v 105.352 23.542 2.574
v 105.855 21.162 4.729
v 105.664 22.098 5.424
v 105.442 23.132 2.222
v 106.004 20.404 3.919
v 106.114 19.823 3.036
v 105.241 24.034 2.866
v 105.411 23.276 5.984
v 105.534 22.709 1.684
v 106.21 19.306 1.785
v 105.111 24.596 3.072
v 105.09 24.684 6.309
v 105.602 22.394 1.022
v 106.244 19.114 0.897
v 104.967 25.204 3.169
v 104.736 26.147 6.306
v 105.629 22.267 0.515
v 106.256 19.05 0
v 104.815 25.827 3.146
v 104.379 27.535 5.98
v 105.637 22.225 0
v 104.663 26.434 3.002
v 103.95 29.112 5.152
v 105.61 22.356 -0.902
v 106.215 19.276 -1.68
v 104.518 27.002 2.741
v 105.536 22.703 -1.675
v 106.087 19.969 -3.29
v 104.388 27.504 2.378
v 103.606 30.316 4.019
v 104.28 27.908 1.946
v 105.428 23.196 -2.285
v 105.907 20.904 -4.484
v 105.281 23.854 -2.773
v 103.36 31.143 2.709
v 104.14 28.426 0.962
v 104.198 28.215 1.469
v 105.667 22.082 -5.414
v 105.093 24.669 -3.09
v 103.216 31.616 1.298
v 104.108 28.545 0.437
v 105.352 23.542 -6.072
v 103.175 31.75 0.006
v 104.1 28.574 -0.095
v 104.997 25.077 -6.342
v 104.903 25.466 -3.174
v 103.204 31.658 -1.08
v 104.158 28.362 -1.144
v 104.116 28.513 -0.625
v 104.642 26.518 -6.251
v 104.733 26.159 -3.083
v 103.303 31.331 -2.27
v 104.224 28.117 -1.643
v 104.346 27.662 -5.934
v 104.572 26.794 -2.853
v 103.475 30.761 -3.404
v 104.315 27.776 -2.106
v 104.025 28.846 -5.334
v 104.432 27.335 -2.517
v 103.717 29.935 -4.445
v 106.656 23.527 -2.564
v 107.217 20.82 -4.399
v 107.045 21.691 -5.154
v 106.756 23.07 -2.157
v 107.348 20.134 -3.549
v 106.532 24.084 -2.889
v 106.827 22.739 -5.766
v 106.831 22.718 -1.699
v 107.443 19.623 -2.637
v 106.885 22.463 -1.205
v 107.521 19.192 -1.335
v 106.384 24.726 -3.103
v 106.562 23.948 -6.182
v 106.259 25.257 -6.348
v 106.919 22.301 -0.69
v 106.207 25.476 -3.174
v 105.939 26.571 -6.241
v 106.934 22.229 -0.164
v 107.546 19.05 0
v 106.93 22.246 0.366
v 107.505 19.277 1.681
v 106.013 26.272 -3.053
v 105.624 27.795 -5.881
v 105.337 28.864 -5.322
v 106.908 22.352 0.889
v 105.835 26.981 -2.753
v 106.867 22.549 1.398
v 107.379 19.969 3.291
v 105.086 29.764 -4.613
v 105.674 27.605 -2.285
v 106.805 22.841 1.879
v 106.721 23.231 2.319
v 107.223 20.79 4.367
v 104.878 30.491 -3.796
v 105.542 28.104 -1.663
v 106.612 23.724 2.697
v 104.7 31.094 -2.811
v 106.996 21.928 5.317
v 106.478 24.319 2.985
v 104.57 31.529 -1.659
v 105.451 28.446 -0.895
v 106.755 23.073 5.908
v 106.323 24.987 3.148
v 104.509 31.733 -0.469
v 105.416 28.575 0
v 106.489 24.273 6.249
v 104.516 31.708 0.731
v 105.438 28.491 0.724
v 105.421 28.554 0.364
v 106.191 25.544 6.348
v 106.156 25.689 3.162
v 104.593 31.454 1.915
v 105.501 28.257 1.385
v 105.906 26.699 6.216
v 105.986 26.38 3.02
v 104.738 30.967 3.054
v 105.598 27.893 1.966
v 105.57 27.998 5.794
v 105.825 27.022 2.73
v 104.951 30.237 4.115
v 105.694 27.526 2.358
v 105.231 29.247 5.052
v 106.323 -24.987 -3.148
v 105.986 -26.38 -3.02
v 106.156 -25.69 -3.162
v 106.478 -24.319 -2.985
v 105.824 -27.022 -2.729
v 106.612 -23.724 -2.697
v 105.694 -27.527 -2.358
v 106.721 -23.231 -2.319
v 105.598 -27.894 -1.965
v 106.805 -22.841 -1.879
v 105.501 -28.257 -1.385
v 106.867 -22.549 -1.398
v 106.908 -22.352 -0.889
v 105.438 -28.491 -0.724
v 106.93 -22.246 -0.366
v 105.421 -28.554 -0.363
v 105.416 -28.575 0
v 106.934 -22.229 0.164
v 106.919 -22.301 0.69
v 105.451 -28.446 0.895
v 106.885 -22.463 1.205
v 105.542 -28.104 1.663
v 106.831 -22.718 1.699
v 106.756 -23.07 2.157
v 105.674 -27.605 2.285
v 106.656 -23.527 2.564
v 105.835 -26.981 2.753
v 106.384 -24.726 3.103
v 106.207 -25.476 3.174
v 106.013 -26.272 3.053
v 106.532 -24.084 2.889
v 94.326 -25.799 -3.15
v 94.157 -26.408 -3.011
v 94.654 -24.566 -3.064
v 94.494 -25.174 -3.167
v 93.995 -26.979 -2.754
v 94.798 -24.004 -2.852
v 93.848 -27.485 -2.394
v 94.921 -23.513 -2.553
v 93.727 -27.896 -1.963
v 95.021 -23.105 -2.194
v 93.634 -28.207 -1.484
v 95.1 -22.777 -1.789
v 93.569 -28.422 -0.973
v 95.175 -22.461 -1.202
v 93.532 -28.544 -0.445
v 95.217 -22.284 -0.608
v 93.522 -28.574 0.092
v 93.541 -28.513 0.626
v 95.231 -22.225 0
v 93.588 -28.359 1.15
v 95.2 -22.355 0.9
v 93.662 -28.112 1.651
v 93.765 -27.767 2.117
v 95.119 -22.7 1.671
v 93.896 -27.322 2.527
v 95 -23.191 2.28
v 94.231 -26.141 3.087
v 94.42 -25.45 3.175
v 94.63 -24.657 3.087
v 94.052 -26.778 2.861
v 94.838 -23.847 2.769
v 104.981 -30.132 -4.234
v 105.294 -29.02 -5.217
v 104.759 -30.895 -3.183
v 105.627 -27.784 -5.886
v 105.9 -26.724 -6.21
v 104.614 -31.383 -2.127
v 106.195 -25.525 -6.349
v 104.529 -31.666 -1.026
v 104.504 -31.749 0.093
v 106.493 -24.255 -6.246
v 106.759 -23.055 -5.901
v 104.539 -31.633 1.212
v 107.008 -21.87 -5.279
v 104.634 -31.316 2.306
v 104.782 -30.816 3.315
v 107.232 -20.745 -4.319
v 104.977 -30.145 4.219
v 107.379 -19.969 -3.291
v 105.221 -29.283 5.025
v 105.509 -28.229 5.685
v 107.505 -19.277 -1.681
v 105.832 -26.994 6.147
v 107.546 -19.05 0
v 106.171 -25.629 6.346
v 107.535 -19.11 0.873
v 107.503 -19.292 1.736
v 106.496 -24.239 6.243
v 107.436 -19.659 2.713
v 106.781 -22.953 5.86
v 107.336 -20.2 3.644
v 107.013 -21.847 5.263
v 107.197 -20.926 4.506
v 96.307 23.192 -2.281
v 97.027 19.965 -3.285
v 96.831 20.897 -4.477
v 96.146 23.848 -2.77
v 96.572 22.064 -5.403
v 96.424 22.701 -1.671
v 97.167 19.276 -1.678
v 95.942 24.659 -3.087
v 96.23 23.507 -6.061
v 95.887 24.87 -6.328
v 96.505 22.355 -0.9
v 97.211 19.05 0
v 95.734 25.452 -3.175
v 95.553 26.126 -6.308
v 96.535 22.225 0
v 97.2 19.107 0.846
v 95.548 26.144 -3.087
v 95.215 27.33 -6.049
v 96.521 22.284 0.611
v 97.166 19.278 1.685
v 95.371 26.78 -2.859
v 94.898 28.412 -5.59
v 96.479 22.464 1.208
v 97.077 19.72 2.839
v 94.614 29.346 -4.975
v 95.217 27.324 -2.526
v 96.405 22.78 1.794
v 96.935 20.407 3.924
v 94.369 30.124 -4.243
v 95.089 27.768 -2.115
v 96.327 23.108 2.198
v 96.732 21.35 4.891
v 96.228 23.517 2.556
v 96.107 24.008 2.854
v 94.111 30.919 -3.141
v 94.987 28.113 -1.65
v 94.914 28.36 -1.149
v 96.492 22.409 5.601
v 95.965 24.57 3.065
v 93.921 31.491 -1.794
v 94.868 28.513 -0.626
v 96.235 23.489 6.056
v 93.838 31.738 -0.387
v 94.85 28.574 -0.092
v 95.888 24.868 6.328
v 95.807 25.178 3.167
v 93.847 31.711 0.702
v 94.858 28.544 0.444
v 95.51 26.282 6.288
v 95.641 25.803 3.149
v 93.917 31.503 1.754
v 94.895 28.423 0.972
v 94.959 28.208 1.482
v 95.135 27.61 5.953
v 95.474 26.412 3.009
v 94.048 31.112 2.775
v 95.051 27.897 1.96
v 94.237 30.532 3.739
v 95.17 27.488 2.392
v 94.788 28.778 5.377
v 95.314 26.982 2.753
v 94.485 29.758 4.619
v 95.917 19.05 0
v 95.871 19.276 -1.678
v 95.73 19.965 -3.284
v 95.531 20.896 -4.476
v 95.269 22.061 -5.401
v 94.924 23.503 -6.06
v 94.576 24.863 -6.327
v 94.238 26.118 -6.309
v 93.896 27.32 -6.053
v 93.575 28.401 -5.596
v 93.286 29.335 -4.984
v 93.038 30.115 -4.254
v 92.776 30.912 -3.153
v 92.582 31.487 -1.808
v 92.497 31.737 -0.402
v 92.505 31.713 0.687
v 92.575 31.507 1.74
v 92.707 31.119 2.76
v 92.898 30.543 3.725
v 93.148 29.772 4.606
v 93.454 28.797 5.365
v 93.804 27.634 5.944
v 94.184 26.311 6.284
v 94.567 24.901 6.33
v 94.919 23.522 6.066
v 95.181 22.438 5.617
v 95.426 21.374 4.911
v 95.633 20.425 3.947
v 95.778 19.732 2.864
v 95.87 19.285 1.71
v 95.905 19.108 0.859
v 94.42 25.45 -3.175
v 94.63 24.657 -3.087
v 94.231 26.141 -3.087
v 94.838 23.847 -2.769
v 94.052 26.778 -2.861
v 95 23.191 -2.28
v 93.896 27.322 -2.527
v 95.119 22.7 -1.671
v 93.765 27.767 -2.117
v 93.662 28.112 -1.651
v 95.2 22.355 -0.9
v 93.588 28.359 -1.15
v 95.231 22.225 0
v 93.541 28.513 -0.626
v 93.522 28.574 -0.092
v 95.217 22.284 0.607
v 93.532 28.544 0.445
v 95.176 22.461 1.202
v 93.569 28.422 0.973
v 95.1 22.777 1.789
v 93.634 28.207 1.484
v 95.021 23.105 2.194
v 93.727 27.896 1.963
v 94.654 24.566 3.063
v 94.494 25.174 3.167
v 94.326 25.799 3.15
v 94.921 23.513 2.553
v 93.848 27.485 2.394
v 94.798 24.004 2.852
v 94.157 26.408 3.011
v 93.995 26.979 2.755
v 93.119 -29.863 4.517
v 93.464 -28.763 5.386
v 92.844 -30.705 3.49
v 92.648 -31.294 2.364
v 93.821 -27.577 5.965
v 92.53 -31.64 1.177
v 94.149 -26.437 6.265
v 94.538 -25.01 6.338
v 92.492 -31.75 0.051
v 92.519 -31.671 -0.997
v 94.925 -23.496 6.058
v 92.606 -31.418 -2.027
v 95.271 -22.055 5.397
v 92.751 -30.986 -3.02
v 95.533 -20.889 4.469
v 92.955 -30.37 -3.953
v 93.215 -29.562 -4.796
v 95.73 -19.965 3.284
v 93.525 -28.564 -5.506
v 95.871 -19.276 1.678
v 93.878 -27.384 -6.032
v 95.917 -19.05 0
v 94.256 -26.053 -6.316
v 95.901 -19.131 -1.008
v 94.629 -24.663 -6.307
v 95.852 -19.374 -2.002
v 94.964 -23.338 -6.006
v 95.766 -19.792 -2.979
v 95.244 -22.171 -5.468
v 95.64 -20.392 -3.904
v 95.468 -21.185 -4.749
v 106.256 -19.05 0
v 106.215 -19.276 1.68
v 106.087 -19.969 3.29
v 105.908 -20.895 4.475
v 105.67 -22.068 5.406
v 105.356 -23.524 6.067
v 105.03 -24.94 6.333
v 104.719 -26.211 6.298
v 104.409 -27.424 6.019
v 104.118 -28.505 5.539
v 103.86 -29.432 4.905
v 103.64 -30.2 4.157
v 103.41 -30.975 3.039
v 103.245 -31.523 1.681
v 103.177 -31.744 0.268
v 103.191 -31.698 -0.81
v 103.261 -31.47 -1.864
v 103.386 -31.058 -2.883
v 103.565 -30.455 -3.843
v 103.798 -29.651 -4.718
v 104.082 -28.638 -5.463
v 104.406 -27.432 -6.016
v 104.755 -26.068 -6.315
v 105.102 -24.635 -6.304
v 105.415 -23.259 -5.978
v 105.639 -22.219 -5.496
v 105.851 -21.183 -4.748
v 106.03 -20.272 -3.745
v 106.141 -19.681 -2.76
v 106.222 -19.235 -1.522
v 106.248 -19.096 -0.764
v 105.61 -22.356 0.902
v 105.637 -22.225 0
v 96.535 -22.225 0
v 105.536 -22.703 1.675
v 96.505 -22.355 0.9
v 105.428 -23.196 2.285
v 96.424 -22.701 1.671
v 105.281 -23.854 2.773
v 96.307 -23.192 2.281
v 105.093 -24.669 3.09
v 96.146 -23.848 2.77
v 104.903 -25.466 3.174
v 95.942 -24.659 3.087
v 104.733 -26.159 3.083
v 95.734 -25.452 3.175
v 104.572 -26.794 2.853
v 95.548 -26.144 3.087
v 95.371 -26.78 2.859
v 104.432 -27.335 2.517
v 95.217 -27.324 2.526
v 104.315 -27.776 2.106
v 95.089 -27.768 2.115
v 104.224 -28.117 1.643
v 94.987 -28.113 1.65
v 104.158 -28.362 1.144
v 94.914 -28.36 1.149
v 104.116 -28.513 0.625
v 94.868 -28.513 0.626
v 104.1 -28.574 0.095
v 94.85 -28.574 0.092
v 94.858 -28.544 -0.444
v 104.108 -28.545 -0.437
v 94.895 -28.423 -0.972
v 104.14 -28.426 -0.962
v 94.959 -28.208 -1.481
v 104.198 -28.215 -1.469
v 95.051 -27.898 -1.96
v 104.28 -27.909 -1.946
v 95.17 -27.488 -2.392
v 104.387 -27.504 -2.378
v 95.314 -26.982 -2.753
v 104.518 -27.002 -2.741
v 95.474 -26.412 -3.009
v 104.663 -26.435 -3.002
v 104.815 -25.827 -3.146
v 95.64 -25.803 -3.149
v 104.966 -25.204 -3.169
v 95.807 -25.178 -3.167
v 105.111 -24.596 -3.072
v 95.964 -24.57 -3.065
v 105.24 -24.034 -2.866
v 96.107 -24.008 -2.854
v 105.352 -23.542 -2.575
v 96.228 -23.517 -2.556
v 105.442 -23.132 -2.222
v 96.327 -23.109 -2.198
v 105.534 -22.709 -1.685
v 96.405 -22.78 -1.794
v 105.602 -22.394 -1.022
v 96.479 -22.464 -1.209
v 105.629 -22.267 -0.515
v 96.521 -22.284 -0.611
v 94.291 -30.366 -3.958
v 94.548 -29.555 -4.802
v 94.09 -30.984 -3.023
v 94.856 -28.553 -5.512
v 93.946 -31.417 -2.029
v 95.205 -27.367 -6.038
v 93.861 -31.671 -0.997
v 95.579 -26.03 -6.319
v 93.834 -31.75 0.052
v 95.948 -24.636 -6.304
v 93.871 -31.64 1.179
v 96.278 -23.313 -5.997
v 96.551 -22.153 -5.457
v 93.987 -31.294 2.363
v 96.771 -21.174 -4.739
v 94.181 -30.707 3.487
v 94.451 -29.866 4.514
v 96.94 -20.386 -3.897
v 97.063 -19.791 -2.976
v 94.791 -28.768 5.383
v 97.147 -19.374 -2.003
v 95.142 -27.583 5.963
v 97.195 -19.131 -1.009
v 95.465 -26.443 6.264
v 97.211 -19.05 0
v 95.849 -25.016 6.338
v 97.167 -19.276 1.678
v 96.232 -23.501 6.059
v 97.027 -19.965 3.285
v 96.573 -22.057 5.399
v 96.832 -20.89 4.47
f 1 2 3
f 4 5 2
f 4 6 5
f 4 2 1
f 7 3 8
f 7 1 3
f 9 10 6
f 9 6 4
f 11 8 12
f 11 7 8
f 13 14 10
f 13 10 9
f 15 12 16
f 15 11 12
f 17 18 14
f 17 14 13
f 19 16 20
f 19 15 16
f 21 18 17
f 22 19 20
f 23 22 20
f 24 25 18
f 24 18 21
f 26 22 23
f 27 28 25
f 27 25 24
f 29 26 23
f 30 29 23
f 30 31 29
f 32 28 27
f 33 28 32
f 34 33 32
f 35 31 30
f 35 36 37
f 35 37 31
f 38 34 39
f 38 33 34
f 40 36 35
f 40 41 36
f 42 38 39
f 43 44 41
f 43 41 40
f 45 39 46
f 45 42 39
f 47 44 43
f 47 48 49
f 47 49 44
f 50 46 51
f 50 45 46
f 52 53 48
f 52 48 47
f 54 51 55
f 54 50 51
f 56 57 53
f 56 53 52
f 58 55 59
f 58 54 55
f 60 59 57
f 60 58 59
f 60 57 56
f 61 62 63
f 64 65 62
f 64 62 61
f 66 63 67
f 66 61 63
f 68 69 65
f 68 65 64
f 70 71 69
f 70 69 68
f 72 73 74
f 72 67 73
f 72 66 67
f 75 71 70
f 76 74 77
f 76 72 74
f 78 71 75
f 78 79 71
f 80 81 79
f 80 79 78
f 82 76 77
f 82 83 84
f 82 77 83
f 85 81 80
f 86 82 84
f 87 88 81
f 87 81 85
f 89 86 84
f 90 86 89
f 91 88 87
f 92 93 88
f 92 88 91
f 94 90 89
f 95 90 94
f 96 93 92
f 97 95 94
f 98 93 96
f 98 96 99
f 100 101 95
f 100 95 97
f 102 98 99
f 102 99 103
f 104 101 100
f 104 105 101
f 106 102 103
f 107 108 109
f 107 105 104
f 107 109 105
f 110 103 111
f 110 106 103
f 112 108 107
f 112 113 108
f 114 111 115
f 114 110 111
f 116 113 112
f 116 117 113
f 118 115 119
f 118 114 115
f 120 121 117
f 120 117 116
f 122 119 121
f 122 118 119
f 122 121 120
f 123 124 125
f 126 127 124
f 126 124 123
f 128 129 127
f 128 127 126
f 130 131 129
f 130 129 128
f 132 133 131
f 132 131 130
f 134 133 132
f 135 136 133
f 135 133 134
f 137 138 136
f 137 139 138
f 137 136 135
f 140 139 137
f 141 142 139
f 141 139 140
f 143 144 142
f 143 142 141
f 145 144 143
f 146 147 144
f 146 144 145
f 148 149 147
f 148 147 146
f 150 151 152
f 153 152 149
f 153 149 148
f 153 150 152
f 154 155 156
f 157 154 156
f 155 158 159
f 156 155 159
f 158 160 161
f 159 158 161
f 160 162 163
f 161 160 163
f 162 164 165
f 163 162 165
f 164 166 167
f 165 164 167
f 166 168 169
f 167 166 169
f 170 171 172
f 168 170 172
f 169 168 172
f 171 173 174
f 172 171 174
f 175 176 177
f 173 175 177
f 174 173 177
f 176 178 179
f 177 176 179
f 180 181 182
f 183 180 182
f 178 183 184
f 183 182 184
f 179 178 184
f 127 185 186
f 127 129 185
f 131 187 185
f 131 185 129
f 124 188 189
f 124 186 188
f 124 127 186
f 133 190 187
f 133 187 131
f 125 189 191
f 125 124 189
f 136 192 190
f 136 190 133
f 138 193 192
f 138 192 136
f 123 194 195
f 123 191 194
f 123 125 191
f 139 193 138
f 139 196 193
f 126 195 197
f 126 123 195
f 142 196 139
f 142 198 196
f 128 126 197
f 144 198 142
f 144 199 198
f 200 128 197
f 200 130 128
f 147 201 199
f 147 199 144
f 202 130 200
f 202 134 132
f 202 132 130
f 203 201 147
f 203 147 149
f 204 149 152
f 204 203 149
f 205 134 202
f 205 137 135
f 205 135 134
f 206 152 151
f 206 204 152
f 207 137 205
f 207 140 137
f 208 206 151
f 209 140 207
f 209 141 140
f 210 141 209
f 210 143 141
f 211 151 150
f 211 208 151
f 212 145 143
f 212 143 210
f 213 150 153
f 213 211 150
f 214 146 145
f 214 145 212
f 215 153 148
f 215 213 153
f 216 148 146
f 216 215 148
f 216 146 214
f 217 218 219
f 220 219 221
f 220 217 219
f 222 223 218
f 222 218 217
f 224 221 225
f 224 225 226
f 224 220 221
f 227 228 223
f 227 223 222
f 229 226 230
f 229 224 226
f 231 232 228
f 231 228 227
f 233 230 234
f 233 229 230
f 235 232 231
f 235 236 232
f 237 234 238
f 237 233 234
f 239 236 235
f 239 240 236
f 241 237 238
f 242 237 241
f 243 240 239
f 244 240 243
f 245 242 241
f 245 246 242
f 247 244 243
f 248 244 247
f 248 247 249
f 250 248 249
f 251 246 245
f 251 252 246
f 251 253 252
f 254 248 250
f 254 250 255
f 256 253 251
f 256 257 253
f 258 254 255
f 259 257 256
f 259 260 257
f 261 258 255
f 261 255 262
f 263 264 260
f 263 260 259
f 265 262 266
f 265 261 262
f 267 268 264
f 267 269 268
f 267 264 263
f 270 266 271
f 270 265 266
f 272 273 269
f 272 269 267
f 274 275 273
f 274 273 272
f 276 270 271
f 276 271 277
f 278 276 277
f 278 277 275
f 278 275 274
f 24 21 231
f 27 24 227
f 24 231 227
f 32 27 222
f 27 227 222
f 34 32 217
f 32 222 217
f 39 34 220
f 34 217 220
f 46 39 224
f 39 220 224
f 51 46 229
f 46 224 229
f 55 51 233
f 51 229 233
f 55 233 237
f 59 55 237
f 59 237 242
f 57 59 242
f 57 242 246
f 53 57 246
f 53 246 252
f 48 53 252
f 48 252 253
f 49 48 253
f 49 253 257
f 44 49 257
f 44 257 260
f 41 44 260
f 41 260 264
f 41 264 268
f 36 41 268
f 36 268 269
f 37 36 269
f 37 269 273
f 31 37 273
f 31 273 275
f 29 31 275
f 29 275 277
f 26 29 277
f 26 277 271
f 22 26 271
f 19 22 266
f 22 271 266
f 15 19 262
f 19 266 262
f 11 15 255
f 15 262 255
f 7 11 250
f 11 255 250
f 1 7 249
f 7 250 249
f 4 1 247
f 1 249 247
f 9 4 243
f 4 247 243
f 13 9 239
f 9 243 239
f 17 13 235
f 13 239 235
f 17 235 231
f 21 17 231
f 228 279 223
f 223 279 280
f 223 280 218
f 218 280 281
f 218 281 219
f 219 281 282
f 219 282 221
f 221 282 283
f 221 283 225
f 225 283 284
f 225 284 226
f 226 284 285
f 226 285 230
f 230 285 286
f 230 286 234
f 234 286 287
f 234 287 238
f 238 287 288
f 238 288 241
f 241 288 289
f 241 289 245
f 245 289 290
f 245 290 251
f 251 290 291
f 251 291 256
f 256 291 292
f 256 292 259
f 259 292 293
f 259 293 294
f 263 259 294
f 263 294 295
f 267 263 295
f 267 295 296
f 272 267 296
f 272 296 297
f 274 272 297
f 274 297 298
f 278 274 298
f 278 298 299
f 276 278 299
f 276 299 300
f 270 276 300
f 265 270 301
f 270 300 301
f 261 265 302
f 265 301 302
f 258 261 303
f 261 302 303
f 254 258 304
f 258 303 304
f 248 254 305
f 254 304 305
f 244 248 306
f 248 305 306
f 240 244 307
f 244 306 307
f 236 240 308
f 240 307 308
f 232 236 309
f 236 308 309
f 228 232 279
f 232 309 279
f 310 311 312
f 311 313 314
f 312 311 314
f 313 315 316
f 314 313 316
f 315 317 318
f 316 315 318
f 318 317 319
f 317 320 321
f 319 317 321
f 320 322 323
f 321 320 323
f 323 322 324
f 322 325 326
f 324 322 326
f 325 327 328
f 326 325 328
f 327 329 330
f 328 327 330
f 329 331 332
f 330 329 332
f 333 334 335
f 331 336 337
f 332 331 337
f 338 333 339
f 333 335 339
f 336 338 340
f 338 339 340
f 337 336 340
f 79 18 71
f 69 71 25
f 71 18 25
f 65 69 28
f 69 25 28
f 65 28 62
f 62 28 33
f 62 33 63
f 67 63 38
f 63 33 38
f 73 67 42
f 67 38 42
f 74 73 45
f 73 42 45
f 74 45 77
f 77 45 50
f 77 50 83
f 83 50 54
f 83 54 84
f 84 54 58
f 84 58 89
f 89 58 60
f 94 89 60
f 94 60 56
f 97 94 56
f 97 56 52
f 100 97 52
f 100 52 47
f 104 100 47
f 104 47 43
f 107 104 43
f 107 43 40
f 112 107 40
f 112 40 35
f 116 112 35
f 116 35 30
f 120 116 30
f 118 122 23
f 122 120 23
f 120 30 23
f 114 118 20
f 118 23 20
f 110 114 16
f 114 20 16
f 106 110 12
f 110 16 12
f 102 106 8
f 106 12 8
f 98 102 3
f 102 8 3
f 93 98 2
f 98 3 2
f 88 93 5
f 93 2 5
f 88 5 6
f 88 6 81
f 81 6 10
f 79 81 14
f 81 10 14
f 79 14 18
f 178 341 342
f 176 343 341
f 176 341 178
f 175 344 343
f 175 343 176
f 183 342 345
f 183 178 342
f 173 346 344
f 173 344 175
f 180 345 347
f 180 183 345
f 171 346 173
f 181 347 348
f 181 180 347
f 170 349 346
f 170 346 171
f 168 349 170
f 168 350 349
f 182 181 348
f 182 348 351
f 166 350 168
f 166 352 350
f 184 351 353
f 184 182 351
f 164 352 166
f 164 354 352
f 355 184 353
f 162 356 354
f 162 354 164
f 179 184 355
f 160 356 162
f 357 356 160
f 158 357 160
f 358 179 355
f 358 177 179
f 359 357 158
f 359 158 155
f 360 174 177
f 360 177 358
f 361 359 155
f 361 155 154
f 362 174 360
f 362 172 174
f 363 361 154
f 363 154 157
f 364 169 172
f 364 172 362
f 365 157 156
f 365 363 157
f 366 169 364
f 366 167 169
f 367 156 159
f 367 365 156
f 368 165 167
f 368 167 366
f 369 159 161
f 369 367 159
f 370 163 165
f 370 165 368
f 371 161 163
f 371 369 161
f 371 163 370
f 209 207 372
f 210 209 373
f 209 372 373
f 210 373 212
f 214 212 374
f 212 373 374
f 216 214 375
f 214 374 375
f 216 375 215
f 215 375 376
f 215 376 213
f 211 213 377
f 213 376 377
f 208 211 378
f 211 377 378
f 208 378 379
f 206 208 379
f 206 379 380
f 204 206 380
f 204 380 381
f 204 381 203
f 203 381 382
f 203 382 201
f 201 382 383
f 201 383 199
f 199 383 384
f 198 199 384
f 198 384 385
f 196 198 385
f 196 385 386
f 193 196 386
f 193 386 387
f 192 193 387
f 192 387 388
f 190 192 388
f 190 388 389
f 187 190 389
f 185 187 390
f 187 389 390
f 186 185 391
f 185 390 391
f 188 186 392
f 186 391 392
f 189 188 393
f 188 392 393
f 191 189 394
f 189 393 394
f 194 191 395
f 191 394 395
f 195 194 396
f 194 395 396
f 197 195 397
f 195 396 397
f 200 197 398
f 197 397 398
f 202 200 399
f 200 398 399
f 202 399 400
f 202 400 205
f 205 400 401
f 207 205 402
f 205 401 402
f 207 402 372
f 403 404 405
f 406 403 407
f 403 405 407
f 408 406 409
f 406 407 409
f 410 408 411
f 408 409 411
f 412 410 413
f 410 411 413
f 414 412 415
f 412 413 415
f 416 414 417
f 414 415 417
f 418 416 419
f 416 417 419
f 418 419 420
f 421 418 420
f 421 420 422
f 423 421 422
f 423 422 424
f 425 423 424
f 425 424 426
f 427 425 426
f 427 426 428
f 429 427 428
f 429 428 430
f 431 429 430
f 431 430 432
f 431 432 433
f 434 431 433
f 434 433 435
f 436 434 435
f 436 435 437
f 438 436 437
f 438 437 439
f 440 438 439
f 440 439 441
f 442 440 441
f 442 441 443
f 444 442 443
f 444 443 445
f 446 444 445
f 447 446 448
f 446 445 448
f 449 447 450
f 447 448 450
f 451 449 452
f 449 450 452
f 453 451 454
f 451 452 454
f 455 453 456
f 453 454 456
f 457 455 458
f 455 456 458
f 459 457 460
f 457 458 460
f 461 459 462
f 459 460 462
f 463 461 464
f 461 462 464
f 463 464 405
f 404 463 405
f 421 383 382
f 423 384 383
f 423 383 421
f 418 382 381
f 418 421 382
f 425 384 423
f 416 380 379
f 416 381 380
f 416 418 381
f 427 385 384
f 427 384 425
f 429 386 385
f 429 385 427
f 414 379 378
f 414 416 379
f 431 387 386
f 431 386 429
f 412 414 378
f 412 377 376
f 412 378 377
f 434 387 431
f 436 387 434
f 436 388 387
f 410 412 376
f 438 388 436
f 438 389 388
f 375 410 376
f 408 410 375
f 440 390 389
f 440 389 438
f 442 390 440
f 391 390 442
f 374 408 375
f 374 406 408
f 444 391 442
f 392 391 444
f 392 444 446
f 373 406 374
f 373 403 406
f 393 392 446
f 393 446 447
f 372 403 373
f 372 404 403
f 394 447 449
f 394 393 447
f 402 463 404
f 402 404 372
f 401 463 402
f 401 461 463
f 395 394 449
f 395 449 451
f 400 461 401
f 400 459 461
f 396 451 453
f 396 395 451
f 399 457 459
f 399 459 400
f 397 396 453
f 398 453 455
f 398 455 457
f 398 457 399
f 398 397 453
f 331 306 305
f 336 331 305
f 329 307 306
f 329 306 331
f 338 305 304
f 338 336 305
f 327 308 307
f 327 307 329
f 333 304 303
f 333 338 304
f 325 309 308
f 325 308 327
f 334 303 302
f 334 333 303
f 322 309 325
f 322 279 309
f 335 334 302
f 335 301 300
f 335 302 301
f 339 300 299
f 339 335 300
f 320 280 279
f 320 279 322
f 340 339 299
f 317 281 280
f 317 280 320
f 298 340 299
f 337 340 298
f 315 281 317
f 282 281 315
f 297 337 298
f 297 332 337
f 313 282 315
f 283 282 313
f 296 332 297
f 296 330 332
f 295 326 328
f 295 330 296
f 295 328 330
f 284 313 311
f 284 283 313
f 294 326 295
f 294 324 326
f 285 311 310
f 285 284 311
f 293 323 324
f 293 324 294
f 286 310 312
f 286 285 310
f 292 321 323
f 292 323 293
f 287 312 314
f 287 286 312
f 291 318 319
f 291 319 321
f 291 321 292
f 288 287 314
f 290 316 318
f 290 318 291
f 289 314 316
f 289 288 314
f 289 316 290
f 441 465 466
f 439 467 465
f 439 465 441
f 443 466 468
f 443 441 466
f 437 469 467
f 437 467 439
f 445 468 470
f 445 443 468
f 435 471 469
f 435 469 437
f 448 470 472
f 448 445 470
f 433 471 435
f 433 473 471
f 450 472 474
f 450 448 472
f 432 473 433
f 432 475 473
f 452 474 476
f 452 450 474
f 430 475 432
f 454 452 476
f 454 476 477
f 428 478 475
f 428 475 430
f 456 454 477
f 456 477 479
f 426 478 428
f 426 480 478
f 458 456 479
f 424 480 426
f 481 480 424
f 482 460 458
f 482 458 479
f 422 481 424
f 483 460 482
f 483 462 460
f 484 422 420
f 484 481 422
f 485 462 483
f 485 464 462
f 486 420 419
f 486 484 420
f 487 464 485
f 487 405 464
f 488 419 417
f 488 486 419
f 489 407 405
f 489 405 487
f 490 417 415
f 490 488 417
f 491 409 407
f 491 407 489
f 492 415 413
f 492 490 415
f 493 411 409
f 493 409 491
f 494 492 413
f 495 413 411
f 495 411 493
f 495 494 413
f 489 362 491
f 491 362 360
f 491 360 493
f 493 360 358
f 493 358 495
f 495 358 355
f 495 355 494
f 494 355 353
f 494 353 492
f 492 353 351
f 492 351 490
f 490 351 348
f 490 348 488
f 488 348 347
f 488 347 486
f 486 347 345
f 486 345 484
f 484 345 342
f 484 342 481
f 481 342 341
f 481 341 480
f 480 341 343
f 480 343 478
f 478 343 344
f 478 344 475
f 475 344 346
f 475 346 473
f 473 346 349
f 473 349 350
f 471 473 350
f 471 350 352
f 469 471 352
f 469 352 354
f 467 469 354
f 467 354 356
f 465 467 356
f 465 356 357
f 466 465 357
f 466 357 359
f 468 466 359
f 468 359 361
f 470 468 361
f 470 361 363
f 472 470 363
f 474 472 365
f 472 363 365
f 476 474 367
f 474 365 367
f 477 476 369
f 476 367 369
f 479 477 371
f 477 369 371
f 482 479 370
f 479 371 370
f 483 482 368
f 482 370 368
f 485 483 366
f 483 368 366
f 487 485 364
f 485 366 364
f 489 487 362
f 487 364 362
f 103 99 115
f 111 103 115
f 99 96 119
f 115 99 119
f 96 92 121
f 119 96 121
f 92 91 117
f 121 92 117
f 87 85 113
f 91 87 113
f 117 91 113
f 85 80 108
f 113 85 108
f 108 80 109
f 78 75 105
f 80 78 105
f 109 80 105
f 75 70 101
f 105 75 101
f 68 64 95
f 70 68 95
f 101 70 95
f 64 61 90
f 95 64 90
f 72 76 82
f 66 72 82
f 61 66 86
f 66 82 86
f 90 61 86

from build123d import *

# Parameters (mm, degrees)
F1_R     = 99.06
F1_R_2   = 97.79
F2_DEPTH = 12.7
F1_R_3   = 109.22
F1_R_4   = 107.95
F0_R     = 6.35
F0_R_2   = 3.175
F3_DEPTH = 208.28
F4_DEPTH = 113.03
F1_R_5   = 152.4
F5_DEPTH = 12.7


with BuildPart() as f2:
    # F1 (on Top) → F2 (new body, symmetric)
    with BuildSketch(Plane.XY):
        Circle(F1_R)
        Circle(F1_R_2, mode=Mode.SUBTRACT)
    extrude(amount=F2_DEPTH, both=True)


with BuildPart() as f2b:
    # F1 (on Top) → F2, piece 2 (new body, symmetric)
    with BuildSketch(Plane.XY):
        Circle(F1_R_3)
        Circle(F1_R_4, mode=Mode.SUBTRACT)
    extrude(amount=F2_DEPTH, both=True)


with BuildPart() as f3_tool:
    # F0 (on Right) → F3 (new body)
    with BuildSketch(Plane.YZ):
        with Locations((-25.4, 0)):
            Circle(F0_R)
        with Locations((-25.4, 0)):
            Circle(F0_R_2, mode=Mode.SUBTRACT)
        with BuildLine():
            ThreePointArc((31.75, 0), (25.4, 6.35), (19.05, 0))
            ThreePointArc((19.05, 0), (25.4, -6.35), (31.75, 0))
        make_face()
        with BuildLine():
            ThreePointArc((28.575, 0), (25.4, -3.175), (22.225, 0))
            ThreePointArc((22.225, 0), (25.4, 3.175), (28.575, 0))
        make_face(mode=Mode.SUBTRACT)
        with Locations((-25.4, 0)):
            Circle(F0_R_2)
        with BuildLine():
            ThreePointArc((28.575, 0), (25.4, 3.175), (22.225, 0))
            ThreePointArc((22.225, 0), (25.4, -3.175), (28.575, 0))
        make_face()
    extrude(amount=F3_DEPTH)


with BuildPart() as f2_1:
    add(f2.part)

    # F3: intersect by f3_tool
    add(f3_tool.part, mode=Mode.INTERSECT)



with BuildPart() as f2b_1:
    add(f2b.part)

    # F3: intersect by f3_tool
    add(f3_tool.part, mode=Mode.INTERSECT)


with BuildPart() as f2_2:
    add(f2_1.part)

    add(f2b_1.part)  # F4 merges F2b
    # F0 (on Right) → F4 (join)
    with BuildSketch(Plane.YZ):
        with Locations((-25.4, 0)):
            Circle(F0_R_2)
        with BuildLine():
            ThreePointArc((28.575, 0), (25.4, 3.175), (22.225, 0))
            ThreePointArc((22.225, 0), (25.4, -3.175), (28.575, 0))
        make_face()
    extrude(amount=F4_DEPTH)

    # F1 (on Top) → F5 (cut, symmetric)
    with BuildSketch(Plane.XY):
        Circle(F1_R_5)
        Circle(F1_R_3, mode=Mode.SUBTRACT)
        Circle(F1_R_2)
    extrude(amount=F5_DEPTH, both=True, mode=Mode.SUBTRACT)


solid = f2_2.part
